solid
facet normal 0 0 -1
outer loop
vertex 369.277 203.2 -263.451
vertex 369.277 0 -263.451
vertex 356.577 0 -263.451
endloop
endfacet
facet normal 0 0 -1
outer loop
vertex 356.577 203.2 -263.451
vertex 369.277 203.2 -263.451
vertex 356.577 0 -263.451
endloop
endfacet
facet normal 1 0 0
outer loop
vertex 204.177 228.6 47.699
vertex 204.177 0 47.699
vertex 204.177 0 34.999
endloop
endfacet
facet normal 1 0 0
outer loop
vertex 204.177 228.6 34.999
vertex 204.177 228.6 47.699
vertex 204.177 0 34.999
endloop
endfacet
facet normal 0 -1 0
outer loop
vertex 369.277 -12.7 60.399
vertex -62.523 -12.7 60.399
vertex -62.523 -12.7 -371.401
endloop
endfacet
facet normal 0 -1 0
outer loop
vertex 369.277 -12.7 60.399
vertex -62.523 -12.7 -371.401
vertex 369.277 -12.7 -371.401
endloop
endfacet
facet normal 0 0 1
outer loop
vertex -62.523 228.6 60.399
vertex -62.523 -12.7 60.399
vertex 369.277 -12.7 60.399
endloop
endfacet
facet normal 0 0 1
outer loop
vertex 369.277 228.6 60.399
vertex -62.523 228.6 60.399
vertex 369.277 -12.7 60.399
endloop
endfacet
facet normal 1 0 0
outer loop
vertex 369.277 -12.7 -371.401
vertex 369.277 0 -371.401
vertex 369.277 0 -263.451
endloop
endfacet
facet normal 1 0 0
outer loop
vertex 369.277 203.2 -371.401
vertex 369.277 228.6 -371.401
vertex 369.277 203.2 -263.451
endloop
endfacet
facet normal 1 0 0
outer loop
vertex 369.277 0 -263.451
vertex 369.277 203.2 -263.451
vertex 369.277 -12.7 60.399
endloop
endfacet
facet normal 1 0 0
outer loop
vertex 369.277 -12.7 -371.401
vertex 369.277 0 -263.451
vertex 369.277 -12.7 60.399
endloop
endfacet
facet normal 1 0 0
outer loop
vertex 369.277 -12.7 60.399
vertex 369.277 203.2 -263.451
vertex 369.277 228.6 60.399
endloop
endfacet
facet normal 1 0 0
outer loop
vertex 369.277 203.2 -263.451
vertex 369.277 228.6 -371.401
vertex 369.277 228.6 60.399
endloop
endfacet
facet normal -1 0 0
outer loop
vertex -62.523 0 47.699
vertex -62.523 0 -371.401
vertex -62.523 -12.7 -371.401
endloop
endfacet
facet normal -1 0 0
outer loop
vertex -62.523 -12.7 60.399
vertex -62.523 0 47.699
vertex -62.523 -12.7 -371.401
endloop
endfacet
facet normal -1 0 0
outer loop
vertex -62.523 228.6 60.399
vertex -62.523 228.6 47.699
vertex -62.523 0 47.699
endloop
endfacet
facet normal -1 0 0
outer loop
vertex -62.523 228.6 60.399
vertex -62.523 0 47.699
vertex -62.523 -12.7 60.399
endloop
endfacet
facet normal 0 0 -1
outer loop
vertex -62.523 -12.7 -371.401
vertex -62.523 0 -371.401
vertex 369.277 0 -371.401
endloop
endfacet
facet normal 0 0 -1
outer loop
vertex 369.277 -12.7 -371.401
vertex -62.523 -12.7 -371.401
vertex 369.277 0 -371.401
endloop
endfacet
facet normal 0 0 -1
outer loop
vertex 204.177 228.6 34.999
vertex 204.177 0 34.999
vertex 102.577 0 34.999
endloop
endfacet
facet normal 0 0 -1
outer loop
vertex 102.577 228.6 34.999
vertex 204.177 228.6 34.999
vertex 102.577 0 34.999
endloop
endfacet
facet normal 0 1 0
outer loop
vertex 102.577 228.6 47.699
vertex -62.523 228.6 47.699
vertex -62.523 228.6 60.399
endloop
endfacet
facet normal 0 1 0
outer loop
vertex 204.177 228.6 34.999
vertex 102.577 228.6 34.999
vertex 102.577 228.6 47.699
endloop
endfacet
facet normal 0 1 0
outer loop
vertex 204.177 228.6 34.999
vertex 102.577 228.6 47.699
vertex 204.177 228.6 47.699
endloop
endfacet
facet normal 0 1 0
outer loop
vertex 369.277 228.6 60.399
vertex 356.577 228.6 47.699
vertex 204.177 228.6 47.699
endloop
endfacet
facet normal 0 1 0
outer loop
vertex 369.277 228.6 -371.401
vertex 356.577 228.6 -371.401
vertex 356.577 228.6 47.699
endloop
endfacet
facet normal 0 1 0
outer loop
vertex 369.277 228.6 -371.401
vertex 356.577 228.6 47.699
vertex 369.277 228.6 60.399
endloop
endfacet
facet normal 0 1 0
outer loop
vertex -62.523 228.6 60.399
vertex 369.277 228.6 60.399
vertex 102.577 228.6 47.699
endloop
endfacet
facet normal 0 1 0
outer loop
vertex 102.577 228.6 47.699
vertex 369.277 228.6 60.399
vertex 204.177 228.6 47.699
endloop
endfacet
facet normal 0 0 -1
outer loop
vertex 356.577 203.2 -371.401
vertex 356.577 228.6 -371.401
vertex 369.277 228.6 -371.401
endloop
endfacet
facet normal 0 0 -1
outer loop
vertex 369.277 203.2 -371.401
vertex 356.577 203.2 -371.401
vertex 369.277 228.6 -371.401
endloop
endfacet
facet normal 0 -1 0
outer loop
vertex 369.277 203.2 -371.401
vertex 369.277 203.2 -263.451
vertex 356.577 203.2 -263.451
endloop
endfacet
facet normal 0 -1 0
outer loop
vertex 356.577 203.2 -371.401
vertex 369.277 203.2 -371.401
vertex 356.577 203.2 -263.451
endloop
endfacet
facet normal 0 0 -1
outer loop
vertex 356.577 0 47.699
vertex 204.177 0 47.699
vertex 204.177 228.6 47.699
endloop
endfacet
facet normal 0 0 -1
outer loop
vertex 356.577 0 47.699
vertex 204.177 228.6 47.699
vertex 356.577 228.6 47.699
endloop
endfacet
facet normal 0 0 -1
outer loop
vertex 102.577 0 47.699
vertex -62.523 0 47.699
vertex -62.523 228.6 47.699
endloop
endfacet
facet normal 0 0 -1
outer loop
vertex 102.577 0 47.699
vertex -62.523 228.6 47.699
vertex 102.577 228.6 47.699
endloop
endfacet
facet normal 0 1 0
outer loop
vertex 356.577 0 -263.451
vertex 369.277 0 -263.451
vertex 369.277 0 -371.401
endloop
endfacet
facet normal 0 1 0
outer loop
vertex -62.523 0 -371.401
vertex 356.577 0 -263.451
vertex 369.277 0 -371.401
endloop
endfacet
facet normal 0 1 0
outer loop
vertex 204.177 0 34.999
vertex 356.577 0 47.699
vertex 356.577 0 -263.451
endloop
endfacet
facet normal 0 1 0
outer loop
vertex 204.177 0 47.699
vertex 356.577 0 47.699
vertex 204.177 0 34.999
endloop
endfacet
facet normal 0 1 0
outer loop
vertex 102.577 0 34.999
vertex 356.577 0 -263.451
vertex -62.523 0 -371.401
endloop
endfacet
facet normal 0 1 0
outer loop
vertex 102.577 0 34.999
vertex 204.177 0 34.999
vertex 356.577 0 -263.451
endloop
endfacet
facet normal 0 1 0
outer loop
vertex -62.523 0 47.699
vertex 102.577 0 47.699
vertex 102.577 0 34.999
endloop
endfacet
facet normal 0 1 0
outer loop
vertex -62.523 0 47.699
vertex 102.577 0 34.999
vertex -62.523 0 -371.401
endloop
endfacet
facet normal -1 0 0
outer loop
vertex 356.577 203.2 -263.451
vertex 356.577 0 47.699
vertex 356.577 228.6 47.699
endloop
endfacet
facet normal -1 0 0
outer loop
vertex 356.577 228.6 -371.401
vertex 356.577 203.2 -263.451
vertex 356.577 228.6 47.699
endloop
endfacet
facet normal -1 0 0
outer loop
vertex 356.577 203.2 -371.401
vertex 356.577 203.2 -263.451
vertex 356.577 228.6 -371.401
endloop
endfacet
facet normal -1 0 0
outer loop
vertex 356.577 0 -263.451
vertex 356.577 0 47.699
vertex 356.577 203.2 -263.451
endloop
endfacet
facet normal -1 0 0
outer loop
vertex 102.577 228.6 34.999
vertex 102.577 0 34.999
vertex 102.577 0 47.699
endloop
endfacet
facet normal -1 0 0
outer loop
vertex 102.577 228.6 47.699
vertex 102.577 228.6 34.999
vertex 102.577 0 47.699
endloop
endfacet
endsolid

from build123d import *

# Parameters (mm, degrees)
SKETCH1_W           = 431.8
SKETCH1_H           = 431.8
SKETCH1_W_2         = 406.4
SKETCH1_H_2         = 406.4
EXTRUDE_THIN1_DEPTH = 228.6
SKETCH2_W           = 431.8
SKETCH2_H           = 431.8
EXTRUDE1_DEPTH      = 12.7
CUT_EXTRUDE1_DEPTH  = 229.6
EXTRUDE2_DEPTH      = 228.6
SKETCH5_W           = 12.7
SKETCH5_H           = 107.95
CUT_EXTRUDE2_DEPTH  = 203.2


with BuildPart() as part:
    # Sketch1 → Extrude-Thin1 (new body)
    with BuildSketch(Plane(origin=(0, 0, 0), x_dir=(1, 0, 0), z_dir=(0, 1, 0))):
        with Locations((153.377464009, 155.501162791)):
            Rectangle(SKETCH1_W, SKETCH1_H)
        with Locations((153.377464009, 155.501162791)):
            Rectangle(SKETCH1_W_2, SKETCH1_H_2, mode=Mode.SUBTRACT)
    extrude(amount=EXTRUDE_THIN1_DEPTH)

    # Sketch2 → Extrude1 (add)
    with BuildSketch(Plane.XZ):
        with Locations((153.377464009, -155.501162791)):
            Rectangle(SKETCH2_W, SKETCH2_H)
    extrude(amount=EXTRUDE1_DEPTH)

    # Sketch3 → Cut-Extrude1 (cut, through all)
    with BuildSketch(Plane(origin=(0, 0, 0), x_dir=(-1, 0, 0), z_dir=(0, 1, 0))):
        Polygon((-356.577464009, -371.401162791), (62.522535991, -371.401162791), (62.522535991, 47.698837209), (49.822535991, 47.698837209), (49.822535991, -358.701162791), (-356.577464009, -358.701162791), align=None)
    extrude(amount=CUT_EXTRUDE1_DEPTH, mode=Mode.SUBTRACT)

    # Sketch4 → Extrude2 (add)
    with BuildSketch(Plane(origin=(0, 0, 0), x_dir=(-1, 0, 0), z_dir=(0, 1, 0))):
        Polygon((-153.377464009, 60.398837209), (-204.177464009, 60.398837209), (-204.177464009, 34.998837209), (-153.377464009, 34.998837209), (-102.577464009, 34.998837209), (-102.577464009, 60.398837209), align=None)
    extrude(amount=EXTRUDE2_DEPTH)

    # Sketch5 → Cut-Extrude2 (cut)
    with BuildSketch(Plane(origin=(0, 0, 0), x_dir=(-1, 0, 0), z_dir=(0, 1, 0))):
        with Locations((-362.927464009, -317.426162791)):
            Rectangle(SKETCH5_W, SKETCH5_H)
    extrude(amount=CUT_EXTRUDE2_DEPTH, mode=Mode.SUBTRACT)


solid = part.part
